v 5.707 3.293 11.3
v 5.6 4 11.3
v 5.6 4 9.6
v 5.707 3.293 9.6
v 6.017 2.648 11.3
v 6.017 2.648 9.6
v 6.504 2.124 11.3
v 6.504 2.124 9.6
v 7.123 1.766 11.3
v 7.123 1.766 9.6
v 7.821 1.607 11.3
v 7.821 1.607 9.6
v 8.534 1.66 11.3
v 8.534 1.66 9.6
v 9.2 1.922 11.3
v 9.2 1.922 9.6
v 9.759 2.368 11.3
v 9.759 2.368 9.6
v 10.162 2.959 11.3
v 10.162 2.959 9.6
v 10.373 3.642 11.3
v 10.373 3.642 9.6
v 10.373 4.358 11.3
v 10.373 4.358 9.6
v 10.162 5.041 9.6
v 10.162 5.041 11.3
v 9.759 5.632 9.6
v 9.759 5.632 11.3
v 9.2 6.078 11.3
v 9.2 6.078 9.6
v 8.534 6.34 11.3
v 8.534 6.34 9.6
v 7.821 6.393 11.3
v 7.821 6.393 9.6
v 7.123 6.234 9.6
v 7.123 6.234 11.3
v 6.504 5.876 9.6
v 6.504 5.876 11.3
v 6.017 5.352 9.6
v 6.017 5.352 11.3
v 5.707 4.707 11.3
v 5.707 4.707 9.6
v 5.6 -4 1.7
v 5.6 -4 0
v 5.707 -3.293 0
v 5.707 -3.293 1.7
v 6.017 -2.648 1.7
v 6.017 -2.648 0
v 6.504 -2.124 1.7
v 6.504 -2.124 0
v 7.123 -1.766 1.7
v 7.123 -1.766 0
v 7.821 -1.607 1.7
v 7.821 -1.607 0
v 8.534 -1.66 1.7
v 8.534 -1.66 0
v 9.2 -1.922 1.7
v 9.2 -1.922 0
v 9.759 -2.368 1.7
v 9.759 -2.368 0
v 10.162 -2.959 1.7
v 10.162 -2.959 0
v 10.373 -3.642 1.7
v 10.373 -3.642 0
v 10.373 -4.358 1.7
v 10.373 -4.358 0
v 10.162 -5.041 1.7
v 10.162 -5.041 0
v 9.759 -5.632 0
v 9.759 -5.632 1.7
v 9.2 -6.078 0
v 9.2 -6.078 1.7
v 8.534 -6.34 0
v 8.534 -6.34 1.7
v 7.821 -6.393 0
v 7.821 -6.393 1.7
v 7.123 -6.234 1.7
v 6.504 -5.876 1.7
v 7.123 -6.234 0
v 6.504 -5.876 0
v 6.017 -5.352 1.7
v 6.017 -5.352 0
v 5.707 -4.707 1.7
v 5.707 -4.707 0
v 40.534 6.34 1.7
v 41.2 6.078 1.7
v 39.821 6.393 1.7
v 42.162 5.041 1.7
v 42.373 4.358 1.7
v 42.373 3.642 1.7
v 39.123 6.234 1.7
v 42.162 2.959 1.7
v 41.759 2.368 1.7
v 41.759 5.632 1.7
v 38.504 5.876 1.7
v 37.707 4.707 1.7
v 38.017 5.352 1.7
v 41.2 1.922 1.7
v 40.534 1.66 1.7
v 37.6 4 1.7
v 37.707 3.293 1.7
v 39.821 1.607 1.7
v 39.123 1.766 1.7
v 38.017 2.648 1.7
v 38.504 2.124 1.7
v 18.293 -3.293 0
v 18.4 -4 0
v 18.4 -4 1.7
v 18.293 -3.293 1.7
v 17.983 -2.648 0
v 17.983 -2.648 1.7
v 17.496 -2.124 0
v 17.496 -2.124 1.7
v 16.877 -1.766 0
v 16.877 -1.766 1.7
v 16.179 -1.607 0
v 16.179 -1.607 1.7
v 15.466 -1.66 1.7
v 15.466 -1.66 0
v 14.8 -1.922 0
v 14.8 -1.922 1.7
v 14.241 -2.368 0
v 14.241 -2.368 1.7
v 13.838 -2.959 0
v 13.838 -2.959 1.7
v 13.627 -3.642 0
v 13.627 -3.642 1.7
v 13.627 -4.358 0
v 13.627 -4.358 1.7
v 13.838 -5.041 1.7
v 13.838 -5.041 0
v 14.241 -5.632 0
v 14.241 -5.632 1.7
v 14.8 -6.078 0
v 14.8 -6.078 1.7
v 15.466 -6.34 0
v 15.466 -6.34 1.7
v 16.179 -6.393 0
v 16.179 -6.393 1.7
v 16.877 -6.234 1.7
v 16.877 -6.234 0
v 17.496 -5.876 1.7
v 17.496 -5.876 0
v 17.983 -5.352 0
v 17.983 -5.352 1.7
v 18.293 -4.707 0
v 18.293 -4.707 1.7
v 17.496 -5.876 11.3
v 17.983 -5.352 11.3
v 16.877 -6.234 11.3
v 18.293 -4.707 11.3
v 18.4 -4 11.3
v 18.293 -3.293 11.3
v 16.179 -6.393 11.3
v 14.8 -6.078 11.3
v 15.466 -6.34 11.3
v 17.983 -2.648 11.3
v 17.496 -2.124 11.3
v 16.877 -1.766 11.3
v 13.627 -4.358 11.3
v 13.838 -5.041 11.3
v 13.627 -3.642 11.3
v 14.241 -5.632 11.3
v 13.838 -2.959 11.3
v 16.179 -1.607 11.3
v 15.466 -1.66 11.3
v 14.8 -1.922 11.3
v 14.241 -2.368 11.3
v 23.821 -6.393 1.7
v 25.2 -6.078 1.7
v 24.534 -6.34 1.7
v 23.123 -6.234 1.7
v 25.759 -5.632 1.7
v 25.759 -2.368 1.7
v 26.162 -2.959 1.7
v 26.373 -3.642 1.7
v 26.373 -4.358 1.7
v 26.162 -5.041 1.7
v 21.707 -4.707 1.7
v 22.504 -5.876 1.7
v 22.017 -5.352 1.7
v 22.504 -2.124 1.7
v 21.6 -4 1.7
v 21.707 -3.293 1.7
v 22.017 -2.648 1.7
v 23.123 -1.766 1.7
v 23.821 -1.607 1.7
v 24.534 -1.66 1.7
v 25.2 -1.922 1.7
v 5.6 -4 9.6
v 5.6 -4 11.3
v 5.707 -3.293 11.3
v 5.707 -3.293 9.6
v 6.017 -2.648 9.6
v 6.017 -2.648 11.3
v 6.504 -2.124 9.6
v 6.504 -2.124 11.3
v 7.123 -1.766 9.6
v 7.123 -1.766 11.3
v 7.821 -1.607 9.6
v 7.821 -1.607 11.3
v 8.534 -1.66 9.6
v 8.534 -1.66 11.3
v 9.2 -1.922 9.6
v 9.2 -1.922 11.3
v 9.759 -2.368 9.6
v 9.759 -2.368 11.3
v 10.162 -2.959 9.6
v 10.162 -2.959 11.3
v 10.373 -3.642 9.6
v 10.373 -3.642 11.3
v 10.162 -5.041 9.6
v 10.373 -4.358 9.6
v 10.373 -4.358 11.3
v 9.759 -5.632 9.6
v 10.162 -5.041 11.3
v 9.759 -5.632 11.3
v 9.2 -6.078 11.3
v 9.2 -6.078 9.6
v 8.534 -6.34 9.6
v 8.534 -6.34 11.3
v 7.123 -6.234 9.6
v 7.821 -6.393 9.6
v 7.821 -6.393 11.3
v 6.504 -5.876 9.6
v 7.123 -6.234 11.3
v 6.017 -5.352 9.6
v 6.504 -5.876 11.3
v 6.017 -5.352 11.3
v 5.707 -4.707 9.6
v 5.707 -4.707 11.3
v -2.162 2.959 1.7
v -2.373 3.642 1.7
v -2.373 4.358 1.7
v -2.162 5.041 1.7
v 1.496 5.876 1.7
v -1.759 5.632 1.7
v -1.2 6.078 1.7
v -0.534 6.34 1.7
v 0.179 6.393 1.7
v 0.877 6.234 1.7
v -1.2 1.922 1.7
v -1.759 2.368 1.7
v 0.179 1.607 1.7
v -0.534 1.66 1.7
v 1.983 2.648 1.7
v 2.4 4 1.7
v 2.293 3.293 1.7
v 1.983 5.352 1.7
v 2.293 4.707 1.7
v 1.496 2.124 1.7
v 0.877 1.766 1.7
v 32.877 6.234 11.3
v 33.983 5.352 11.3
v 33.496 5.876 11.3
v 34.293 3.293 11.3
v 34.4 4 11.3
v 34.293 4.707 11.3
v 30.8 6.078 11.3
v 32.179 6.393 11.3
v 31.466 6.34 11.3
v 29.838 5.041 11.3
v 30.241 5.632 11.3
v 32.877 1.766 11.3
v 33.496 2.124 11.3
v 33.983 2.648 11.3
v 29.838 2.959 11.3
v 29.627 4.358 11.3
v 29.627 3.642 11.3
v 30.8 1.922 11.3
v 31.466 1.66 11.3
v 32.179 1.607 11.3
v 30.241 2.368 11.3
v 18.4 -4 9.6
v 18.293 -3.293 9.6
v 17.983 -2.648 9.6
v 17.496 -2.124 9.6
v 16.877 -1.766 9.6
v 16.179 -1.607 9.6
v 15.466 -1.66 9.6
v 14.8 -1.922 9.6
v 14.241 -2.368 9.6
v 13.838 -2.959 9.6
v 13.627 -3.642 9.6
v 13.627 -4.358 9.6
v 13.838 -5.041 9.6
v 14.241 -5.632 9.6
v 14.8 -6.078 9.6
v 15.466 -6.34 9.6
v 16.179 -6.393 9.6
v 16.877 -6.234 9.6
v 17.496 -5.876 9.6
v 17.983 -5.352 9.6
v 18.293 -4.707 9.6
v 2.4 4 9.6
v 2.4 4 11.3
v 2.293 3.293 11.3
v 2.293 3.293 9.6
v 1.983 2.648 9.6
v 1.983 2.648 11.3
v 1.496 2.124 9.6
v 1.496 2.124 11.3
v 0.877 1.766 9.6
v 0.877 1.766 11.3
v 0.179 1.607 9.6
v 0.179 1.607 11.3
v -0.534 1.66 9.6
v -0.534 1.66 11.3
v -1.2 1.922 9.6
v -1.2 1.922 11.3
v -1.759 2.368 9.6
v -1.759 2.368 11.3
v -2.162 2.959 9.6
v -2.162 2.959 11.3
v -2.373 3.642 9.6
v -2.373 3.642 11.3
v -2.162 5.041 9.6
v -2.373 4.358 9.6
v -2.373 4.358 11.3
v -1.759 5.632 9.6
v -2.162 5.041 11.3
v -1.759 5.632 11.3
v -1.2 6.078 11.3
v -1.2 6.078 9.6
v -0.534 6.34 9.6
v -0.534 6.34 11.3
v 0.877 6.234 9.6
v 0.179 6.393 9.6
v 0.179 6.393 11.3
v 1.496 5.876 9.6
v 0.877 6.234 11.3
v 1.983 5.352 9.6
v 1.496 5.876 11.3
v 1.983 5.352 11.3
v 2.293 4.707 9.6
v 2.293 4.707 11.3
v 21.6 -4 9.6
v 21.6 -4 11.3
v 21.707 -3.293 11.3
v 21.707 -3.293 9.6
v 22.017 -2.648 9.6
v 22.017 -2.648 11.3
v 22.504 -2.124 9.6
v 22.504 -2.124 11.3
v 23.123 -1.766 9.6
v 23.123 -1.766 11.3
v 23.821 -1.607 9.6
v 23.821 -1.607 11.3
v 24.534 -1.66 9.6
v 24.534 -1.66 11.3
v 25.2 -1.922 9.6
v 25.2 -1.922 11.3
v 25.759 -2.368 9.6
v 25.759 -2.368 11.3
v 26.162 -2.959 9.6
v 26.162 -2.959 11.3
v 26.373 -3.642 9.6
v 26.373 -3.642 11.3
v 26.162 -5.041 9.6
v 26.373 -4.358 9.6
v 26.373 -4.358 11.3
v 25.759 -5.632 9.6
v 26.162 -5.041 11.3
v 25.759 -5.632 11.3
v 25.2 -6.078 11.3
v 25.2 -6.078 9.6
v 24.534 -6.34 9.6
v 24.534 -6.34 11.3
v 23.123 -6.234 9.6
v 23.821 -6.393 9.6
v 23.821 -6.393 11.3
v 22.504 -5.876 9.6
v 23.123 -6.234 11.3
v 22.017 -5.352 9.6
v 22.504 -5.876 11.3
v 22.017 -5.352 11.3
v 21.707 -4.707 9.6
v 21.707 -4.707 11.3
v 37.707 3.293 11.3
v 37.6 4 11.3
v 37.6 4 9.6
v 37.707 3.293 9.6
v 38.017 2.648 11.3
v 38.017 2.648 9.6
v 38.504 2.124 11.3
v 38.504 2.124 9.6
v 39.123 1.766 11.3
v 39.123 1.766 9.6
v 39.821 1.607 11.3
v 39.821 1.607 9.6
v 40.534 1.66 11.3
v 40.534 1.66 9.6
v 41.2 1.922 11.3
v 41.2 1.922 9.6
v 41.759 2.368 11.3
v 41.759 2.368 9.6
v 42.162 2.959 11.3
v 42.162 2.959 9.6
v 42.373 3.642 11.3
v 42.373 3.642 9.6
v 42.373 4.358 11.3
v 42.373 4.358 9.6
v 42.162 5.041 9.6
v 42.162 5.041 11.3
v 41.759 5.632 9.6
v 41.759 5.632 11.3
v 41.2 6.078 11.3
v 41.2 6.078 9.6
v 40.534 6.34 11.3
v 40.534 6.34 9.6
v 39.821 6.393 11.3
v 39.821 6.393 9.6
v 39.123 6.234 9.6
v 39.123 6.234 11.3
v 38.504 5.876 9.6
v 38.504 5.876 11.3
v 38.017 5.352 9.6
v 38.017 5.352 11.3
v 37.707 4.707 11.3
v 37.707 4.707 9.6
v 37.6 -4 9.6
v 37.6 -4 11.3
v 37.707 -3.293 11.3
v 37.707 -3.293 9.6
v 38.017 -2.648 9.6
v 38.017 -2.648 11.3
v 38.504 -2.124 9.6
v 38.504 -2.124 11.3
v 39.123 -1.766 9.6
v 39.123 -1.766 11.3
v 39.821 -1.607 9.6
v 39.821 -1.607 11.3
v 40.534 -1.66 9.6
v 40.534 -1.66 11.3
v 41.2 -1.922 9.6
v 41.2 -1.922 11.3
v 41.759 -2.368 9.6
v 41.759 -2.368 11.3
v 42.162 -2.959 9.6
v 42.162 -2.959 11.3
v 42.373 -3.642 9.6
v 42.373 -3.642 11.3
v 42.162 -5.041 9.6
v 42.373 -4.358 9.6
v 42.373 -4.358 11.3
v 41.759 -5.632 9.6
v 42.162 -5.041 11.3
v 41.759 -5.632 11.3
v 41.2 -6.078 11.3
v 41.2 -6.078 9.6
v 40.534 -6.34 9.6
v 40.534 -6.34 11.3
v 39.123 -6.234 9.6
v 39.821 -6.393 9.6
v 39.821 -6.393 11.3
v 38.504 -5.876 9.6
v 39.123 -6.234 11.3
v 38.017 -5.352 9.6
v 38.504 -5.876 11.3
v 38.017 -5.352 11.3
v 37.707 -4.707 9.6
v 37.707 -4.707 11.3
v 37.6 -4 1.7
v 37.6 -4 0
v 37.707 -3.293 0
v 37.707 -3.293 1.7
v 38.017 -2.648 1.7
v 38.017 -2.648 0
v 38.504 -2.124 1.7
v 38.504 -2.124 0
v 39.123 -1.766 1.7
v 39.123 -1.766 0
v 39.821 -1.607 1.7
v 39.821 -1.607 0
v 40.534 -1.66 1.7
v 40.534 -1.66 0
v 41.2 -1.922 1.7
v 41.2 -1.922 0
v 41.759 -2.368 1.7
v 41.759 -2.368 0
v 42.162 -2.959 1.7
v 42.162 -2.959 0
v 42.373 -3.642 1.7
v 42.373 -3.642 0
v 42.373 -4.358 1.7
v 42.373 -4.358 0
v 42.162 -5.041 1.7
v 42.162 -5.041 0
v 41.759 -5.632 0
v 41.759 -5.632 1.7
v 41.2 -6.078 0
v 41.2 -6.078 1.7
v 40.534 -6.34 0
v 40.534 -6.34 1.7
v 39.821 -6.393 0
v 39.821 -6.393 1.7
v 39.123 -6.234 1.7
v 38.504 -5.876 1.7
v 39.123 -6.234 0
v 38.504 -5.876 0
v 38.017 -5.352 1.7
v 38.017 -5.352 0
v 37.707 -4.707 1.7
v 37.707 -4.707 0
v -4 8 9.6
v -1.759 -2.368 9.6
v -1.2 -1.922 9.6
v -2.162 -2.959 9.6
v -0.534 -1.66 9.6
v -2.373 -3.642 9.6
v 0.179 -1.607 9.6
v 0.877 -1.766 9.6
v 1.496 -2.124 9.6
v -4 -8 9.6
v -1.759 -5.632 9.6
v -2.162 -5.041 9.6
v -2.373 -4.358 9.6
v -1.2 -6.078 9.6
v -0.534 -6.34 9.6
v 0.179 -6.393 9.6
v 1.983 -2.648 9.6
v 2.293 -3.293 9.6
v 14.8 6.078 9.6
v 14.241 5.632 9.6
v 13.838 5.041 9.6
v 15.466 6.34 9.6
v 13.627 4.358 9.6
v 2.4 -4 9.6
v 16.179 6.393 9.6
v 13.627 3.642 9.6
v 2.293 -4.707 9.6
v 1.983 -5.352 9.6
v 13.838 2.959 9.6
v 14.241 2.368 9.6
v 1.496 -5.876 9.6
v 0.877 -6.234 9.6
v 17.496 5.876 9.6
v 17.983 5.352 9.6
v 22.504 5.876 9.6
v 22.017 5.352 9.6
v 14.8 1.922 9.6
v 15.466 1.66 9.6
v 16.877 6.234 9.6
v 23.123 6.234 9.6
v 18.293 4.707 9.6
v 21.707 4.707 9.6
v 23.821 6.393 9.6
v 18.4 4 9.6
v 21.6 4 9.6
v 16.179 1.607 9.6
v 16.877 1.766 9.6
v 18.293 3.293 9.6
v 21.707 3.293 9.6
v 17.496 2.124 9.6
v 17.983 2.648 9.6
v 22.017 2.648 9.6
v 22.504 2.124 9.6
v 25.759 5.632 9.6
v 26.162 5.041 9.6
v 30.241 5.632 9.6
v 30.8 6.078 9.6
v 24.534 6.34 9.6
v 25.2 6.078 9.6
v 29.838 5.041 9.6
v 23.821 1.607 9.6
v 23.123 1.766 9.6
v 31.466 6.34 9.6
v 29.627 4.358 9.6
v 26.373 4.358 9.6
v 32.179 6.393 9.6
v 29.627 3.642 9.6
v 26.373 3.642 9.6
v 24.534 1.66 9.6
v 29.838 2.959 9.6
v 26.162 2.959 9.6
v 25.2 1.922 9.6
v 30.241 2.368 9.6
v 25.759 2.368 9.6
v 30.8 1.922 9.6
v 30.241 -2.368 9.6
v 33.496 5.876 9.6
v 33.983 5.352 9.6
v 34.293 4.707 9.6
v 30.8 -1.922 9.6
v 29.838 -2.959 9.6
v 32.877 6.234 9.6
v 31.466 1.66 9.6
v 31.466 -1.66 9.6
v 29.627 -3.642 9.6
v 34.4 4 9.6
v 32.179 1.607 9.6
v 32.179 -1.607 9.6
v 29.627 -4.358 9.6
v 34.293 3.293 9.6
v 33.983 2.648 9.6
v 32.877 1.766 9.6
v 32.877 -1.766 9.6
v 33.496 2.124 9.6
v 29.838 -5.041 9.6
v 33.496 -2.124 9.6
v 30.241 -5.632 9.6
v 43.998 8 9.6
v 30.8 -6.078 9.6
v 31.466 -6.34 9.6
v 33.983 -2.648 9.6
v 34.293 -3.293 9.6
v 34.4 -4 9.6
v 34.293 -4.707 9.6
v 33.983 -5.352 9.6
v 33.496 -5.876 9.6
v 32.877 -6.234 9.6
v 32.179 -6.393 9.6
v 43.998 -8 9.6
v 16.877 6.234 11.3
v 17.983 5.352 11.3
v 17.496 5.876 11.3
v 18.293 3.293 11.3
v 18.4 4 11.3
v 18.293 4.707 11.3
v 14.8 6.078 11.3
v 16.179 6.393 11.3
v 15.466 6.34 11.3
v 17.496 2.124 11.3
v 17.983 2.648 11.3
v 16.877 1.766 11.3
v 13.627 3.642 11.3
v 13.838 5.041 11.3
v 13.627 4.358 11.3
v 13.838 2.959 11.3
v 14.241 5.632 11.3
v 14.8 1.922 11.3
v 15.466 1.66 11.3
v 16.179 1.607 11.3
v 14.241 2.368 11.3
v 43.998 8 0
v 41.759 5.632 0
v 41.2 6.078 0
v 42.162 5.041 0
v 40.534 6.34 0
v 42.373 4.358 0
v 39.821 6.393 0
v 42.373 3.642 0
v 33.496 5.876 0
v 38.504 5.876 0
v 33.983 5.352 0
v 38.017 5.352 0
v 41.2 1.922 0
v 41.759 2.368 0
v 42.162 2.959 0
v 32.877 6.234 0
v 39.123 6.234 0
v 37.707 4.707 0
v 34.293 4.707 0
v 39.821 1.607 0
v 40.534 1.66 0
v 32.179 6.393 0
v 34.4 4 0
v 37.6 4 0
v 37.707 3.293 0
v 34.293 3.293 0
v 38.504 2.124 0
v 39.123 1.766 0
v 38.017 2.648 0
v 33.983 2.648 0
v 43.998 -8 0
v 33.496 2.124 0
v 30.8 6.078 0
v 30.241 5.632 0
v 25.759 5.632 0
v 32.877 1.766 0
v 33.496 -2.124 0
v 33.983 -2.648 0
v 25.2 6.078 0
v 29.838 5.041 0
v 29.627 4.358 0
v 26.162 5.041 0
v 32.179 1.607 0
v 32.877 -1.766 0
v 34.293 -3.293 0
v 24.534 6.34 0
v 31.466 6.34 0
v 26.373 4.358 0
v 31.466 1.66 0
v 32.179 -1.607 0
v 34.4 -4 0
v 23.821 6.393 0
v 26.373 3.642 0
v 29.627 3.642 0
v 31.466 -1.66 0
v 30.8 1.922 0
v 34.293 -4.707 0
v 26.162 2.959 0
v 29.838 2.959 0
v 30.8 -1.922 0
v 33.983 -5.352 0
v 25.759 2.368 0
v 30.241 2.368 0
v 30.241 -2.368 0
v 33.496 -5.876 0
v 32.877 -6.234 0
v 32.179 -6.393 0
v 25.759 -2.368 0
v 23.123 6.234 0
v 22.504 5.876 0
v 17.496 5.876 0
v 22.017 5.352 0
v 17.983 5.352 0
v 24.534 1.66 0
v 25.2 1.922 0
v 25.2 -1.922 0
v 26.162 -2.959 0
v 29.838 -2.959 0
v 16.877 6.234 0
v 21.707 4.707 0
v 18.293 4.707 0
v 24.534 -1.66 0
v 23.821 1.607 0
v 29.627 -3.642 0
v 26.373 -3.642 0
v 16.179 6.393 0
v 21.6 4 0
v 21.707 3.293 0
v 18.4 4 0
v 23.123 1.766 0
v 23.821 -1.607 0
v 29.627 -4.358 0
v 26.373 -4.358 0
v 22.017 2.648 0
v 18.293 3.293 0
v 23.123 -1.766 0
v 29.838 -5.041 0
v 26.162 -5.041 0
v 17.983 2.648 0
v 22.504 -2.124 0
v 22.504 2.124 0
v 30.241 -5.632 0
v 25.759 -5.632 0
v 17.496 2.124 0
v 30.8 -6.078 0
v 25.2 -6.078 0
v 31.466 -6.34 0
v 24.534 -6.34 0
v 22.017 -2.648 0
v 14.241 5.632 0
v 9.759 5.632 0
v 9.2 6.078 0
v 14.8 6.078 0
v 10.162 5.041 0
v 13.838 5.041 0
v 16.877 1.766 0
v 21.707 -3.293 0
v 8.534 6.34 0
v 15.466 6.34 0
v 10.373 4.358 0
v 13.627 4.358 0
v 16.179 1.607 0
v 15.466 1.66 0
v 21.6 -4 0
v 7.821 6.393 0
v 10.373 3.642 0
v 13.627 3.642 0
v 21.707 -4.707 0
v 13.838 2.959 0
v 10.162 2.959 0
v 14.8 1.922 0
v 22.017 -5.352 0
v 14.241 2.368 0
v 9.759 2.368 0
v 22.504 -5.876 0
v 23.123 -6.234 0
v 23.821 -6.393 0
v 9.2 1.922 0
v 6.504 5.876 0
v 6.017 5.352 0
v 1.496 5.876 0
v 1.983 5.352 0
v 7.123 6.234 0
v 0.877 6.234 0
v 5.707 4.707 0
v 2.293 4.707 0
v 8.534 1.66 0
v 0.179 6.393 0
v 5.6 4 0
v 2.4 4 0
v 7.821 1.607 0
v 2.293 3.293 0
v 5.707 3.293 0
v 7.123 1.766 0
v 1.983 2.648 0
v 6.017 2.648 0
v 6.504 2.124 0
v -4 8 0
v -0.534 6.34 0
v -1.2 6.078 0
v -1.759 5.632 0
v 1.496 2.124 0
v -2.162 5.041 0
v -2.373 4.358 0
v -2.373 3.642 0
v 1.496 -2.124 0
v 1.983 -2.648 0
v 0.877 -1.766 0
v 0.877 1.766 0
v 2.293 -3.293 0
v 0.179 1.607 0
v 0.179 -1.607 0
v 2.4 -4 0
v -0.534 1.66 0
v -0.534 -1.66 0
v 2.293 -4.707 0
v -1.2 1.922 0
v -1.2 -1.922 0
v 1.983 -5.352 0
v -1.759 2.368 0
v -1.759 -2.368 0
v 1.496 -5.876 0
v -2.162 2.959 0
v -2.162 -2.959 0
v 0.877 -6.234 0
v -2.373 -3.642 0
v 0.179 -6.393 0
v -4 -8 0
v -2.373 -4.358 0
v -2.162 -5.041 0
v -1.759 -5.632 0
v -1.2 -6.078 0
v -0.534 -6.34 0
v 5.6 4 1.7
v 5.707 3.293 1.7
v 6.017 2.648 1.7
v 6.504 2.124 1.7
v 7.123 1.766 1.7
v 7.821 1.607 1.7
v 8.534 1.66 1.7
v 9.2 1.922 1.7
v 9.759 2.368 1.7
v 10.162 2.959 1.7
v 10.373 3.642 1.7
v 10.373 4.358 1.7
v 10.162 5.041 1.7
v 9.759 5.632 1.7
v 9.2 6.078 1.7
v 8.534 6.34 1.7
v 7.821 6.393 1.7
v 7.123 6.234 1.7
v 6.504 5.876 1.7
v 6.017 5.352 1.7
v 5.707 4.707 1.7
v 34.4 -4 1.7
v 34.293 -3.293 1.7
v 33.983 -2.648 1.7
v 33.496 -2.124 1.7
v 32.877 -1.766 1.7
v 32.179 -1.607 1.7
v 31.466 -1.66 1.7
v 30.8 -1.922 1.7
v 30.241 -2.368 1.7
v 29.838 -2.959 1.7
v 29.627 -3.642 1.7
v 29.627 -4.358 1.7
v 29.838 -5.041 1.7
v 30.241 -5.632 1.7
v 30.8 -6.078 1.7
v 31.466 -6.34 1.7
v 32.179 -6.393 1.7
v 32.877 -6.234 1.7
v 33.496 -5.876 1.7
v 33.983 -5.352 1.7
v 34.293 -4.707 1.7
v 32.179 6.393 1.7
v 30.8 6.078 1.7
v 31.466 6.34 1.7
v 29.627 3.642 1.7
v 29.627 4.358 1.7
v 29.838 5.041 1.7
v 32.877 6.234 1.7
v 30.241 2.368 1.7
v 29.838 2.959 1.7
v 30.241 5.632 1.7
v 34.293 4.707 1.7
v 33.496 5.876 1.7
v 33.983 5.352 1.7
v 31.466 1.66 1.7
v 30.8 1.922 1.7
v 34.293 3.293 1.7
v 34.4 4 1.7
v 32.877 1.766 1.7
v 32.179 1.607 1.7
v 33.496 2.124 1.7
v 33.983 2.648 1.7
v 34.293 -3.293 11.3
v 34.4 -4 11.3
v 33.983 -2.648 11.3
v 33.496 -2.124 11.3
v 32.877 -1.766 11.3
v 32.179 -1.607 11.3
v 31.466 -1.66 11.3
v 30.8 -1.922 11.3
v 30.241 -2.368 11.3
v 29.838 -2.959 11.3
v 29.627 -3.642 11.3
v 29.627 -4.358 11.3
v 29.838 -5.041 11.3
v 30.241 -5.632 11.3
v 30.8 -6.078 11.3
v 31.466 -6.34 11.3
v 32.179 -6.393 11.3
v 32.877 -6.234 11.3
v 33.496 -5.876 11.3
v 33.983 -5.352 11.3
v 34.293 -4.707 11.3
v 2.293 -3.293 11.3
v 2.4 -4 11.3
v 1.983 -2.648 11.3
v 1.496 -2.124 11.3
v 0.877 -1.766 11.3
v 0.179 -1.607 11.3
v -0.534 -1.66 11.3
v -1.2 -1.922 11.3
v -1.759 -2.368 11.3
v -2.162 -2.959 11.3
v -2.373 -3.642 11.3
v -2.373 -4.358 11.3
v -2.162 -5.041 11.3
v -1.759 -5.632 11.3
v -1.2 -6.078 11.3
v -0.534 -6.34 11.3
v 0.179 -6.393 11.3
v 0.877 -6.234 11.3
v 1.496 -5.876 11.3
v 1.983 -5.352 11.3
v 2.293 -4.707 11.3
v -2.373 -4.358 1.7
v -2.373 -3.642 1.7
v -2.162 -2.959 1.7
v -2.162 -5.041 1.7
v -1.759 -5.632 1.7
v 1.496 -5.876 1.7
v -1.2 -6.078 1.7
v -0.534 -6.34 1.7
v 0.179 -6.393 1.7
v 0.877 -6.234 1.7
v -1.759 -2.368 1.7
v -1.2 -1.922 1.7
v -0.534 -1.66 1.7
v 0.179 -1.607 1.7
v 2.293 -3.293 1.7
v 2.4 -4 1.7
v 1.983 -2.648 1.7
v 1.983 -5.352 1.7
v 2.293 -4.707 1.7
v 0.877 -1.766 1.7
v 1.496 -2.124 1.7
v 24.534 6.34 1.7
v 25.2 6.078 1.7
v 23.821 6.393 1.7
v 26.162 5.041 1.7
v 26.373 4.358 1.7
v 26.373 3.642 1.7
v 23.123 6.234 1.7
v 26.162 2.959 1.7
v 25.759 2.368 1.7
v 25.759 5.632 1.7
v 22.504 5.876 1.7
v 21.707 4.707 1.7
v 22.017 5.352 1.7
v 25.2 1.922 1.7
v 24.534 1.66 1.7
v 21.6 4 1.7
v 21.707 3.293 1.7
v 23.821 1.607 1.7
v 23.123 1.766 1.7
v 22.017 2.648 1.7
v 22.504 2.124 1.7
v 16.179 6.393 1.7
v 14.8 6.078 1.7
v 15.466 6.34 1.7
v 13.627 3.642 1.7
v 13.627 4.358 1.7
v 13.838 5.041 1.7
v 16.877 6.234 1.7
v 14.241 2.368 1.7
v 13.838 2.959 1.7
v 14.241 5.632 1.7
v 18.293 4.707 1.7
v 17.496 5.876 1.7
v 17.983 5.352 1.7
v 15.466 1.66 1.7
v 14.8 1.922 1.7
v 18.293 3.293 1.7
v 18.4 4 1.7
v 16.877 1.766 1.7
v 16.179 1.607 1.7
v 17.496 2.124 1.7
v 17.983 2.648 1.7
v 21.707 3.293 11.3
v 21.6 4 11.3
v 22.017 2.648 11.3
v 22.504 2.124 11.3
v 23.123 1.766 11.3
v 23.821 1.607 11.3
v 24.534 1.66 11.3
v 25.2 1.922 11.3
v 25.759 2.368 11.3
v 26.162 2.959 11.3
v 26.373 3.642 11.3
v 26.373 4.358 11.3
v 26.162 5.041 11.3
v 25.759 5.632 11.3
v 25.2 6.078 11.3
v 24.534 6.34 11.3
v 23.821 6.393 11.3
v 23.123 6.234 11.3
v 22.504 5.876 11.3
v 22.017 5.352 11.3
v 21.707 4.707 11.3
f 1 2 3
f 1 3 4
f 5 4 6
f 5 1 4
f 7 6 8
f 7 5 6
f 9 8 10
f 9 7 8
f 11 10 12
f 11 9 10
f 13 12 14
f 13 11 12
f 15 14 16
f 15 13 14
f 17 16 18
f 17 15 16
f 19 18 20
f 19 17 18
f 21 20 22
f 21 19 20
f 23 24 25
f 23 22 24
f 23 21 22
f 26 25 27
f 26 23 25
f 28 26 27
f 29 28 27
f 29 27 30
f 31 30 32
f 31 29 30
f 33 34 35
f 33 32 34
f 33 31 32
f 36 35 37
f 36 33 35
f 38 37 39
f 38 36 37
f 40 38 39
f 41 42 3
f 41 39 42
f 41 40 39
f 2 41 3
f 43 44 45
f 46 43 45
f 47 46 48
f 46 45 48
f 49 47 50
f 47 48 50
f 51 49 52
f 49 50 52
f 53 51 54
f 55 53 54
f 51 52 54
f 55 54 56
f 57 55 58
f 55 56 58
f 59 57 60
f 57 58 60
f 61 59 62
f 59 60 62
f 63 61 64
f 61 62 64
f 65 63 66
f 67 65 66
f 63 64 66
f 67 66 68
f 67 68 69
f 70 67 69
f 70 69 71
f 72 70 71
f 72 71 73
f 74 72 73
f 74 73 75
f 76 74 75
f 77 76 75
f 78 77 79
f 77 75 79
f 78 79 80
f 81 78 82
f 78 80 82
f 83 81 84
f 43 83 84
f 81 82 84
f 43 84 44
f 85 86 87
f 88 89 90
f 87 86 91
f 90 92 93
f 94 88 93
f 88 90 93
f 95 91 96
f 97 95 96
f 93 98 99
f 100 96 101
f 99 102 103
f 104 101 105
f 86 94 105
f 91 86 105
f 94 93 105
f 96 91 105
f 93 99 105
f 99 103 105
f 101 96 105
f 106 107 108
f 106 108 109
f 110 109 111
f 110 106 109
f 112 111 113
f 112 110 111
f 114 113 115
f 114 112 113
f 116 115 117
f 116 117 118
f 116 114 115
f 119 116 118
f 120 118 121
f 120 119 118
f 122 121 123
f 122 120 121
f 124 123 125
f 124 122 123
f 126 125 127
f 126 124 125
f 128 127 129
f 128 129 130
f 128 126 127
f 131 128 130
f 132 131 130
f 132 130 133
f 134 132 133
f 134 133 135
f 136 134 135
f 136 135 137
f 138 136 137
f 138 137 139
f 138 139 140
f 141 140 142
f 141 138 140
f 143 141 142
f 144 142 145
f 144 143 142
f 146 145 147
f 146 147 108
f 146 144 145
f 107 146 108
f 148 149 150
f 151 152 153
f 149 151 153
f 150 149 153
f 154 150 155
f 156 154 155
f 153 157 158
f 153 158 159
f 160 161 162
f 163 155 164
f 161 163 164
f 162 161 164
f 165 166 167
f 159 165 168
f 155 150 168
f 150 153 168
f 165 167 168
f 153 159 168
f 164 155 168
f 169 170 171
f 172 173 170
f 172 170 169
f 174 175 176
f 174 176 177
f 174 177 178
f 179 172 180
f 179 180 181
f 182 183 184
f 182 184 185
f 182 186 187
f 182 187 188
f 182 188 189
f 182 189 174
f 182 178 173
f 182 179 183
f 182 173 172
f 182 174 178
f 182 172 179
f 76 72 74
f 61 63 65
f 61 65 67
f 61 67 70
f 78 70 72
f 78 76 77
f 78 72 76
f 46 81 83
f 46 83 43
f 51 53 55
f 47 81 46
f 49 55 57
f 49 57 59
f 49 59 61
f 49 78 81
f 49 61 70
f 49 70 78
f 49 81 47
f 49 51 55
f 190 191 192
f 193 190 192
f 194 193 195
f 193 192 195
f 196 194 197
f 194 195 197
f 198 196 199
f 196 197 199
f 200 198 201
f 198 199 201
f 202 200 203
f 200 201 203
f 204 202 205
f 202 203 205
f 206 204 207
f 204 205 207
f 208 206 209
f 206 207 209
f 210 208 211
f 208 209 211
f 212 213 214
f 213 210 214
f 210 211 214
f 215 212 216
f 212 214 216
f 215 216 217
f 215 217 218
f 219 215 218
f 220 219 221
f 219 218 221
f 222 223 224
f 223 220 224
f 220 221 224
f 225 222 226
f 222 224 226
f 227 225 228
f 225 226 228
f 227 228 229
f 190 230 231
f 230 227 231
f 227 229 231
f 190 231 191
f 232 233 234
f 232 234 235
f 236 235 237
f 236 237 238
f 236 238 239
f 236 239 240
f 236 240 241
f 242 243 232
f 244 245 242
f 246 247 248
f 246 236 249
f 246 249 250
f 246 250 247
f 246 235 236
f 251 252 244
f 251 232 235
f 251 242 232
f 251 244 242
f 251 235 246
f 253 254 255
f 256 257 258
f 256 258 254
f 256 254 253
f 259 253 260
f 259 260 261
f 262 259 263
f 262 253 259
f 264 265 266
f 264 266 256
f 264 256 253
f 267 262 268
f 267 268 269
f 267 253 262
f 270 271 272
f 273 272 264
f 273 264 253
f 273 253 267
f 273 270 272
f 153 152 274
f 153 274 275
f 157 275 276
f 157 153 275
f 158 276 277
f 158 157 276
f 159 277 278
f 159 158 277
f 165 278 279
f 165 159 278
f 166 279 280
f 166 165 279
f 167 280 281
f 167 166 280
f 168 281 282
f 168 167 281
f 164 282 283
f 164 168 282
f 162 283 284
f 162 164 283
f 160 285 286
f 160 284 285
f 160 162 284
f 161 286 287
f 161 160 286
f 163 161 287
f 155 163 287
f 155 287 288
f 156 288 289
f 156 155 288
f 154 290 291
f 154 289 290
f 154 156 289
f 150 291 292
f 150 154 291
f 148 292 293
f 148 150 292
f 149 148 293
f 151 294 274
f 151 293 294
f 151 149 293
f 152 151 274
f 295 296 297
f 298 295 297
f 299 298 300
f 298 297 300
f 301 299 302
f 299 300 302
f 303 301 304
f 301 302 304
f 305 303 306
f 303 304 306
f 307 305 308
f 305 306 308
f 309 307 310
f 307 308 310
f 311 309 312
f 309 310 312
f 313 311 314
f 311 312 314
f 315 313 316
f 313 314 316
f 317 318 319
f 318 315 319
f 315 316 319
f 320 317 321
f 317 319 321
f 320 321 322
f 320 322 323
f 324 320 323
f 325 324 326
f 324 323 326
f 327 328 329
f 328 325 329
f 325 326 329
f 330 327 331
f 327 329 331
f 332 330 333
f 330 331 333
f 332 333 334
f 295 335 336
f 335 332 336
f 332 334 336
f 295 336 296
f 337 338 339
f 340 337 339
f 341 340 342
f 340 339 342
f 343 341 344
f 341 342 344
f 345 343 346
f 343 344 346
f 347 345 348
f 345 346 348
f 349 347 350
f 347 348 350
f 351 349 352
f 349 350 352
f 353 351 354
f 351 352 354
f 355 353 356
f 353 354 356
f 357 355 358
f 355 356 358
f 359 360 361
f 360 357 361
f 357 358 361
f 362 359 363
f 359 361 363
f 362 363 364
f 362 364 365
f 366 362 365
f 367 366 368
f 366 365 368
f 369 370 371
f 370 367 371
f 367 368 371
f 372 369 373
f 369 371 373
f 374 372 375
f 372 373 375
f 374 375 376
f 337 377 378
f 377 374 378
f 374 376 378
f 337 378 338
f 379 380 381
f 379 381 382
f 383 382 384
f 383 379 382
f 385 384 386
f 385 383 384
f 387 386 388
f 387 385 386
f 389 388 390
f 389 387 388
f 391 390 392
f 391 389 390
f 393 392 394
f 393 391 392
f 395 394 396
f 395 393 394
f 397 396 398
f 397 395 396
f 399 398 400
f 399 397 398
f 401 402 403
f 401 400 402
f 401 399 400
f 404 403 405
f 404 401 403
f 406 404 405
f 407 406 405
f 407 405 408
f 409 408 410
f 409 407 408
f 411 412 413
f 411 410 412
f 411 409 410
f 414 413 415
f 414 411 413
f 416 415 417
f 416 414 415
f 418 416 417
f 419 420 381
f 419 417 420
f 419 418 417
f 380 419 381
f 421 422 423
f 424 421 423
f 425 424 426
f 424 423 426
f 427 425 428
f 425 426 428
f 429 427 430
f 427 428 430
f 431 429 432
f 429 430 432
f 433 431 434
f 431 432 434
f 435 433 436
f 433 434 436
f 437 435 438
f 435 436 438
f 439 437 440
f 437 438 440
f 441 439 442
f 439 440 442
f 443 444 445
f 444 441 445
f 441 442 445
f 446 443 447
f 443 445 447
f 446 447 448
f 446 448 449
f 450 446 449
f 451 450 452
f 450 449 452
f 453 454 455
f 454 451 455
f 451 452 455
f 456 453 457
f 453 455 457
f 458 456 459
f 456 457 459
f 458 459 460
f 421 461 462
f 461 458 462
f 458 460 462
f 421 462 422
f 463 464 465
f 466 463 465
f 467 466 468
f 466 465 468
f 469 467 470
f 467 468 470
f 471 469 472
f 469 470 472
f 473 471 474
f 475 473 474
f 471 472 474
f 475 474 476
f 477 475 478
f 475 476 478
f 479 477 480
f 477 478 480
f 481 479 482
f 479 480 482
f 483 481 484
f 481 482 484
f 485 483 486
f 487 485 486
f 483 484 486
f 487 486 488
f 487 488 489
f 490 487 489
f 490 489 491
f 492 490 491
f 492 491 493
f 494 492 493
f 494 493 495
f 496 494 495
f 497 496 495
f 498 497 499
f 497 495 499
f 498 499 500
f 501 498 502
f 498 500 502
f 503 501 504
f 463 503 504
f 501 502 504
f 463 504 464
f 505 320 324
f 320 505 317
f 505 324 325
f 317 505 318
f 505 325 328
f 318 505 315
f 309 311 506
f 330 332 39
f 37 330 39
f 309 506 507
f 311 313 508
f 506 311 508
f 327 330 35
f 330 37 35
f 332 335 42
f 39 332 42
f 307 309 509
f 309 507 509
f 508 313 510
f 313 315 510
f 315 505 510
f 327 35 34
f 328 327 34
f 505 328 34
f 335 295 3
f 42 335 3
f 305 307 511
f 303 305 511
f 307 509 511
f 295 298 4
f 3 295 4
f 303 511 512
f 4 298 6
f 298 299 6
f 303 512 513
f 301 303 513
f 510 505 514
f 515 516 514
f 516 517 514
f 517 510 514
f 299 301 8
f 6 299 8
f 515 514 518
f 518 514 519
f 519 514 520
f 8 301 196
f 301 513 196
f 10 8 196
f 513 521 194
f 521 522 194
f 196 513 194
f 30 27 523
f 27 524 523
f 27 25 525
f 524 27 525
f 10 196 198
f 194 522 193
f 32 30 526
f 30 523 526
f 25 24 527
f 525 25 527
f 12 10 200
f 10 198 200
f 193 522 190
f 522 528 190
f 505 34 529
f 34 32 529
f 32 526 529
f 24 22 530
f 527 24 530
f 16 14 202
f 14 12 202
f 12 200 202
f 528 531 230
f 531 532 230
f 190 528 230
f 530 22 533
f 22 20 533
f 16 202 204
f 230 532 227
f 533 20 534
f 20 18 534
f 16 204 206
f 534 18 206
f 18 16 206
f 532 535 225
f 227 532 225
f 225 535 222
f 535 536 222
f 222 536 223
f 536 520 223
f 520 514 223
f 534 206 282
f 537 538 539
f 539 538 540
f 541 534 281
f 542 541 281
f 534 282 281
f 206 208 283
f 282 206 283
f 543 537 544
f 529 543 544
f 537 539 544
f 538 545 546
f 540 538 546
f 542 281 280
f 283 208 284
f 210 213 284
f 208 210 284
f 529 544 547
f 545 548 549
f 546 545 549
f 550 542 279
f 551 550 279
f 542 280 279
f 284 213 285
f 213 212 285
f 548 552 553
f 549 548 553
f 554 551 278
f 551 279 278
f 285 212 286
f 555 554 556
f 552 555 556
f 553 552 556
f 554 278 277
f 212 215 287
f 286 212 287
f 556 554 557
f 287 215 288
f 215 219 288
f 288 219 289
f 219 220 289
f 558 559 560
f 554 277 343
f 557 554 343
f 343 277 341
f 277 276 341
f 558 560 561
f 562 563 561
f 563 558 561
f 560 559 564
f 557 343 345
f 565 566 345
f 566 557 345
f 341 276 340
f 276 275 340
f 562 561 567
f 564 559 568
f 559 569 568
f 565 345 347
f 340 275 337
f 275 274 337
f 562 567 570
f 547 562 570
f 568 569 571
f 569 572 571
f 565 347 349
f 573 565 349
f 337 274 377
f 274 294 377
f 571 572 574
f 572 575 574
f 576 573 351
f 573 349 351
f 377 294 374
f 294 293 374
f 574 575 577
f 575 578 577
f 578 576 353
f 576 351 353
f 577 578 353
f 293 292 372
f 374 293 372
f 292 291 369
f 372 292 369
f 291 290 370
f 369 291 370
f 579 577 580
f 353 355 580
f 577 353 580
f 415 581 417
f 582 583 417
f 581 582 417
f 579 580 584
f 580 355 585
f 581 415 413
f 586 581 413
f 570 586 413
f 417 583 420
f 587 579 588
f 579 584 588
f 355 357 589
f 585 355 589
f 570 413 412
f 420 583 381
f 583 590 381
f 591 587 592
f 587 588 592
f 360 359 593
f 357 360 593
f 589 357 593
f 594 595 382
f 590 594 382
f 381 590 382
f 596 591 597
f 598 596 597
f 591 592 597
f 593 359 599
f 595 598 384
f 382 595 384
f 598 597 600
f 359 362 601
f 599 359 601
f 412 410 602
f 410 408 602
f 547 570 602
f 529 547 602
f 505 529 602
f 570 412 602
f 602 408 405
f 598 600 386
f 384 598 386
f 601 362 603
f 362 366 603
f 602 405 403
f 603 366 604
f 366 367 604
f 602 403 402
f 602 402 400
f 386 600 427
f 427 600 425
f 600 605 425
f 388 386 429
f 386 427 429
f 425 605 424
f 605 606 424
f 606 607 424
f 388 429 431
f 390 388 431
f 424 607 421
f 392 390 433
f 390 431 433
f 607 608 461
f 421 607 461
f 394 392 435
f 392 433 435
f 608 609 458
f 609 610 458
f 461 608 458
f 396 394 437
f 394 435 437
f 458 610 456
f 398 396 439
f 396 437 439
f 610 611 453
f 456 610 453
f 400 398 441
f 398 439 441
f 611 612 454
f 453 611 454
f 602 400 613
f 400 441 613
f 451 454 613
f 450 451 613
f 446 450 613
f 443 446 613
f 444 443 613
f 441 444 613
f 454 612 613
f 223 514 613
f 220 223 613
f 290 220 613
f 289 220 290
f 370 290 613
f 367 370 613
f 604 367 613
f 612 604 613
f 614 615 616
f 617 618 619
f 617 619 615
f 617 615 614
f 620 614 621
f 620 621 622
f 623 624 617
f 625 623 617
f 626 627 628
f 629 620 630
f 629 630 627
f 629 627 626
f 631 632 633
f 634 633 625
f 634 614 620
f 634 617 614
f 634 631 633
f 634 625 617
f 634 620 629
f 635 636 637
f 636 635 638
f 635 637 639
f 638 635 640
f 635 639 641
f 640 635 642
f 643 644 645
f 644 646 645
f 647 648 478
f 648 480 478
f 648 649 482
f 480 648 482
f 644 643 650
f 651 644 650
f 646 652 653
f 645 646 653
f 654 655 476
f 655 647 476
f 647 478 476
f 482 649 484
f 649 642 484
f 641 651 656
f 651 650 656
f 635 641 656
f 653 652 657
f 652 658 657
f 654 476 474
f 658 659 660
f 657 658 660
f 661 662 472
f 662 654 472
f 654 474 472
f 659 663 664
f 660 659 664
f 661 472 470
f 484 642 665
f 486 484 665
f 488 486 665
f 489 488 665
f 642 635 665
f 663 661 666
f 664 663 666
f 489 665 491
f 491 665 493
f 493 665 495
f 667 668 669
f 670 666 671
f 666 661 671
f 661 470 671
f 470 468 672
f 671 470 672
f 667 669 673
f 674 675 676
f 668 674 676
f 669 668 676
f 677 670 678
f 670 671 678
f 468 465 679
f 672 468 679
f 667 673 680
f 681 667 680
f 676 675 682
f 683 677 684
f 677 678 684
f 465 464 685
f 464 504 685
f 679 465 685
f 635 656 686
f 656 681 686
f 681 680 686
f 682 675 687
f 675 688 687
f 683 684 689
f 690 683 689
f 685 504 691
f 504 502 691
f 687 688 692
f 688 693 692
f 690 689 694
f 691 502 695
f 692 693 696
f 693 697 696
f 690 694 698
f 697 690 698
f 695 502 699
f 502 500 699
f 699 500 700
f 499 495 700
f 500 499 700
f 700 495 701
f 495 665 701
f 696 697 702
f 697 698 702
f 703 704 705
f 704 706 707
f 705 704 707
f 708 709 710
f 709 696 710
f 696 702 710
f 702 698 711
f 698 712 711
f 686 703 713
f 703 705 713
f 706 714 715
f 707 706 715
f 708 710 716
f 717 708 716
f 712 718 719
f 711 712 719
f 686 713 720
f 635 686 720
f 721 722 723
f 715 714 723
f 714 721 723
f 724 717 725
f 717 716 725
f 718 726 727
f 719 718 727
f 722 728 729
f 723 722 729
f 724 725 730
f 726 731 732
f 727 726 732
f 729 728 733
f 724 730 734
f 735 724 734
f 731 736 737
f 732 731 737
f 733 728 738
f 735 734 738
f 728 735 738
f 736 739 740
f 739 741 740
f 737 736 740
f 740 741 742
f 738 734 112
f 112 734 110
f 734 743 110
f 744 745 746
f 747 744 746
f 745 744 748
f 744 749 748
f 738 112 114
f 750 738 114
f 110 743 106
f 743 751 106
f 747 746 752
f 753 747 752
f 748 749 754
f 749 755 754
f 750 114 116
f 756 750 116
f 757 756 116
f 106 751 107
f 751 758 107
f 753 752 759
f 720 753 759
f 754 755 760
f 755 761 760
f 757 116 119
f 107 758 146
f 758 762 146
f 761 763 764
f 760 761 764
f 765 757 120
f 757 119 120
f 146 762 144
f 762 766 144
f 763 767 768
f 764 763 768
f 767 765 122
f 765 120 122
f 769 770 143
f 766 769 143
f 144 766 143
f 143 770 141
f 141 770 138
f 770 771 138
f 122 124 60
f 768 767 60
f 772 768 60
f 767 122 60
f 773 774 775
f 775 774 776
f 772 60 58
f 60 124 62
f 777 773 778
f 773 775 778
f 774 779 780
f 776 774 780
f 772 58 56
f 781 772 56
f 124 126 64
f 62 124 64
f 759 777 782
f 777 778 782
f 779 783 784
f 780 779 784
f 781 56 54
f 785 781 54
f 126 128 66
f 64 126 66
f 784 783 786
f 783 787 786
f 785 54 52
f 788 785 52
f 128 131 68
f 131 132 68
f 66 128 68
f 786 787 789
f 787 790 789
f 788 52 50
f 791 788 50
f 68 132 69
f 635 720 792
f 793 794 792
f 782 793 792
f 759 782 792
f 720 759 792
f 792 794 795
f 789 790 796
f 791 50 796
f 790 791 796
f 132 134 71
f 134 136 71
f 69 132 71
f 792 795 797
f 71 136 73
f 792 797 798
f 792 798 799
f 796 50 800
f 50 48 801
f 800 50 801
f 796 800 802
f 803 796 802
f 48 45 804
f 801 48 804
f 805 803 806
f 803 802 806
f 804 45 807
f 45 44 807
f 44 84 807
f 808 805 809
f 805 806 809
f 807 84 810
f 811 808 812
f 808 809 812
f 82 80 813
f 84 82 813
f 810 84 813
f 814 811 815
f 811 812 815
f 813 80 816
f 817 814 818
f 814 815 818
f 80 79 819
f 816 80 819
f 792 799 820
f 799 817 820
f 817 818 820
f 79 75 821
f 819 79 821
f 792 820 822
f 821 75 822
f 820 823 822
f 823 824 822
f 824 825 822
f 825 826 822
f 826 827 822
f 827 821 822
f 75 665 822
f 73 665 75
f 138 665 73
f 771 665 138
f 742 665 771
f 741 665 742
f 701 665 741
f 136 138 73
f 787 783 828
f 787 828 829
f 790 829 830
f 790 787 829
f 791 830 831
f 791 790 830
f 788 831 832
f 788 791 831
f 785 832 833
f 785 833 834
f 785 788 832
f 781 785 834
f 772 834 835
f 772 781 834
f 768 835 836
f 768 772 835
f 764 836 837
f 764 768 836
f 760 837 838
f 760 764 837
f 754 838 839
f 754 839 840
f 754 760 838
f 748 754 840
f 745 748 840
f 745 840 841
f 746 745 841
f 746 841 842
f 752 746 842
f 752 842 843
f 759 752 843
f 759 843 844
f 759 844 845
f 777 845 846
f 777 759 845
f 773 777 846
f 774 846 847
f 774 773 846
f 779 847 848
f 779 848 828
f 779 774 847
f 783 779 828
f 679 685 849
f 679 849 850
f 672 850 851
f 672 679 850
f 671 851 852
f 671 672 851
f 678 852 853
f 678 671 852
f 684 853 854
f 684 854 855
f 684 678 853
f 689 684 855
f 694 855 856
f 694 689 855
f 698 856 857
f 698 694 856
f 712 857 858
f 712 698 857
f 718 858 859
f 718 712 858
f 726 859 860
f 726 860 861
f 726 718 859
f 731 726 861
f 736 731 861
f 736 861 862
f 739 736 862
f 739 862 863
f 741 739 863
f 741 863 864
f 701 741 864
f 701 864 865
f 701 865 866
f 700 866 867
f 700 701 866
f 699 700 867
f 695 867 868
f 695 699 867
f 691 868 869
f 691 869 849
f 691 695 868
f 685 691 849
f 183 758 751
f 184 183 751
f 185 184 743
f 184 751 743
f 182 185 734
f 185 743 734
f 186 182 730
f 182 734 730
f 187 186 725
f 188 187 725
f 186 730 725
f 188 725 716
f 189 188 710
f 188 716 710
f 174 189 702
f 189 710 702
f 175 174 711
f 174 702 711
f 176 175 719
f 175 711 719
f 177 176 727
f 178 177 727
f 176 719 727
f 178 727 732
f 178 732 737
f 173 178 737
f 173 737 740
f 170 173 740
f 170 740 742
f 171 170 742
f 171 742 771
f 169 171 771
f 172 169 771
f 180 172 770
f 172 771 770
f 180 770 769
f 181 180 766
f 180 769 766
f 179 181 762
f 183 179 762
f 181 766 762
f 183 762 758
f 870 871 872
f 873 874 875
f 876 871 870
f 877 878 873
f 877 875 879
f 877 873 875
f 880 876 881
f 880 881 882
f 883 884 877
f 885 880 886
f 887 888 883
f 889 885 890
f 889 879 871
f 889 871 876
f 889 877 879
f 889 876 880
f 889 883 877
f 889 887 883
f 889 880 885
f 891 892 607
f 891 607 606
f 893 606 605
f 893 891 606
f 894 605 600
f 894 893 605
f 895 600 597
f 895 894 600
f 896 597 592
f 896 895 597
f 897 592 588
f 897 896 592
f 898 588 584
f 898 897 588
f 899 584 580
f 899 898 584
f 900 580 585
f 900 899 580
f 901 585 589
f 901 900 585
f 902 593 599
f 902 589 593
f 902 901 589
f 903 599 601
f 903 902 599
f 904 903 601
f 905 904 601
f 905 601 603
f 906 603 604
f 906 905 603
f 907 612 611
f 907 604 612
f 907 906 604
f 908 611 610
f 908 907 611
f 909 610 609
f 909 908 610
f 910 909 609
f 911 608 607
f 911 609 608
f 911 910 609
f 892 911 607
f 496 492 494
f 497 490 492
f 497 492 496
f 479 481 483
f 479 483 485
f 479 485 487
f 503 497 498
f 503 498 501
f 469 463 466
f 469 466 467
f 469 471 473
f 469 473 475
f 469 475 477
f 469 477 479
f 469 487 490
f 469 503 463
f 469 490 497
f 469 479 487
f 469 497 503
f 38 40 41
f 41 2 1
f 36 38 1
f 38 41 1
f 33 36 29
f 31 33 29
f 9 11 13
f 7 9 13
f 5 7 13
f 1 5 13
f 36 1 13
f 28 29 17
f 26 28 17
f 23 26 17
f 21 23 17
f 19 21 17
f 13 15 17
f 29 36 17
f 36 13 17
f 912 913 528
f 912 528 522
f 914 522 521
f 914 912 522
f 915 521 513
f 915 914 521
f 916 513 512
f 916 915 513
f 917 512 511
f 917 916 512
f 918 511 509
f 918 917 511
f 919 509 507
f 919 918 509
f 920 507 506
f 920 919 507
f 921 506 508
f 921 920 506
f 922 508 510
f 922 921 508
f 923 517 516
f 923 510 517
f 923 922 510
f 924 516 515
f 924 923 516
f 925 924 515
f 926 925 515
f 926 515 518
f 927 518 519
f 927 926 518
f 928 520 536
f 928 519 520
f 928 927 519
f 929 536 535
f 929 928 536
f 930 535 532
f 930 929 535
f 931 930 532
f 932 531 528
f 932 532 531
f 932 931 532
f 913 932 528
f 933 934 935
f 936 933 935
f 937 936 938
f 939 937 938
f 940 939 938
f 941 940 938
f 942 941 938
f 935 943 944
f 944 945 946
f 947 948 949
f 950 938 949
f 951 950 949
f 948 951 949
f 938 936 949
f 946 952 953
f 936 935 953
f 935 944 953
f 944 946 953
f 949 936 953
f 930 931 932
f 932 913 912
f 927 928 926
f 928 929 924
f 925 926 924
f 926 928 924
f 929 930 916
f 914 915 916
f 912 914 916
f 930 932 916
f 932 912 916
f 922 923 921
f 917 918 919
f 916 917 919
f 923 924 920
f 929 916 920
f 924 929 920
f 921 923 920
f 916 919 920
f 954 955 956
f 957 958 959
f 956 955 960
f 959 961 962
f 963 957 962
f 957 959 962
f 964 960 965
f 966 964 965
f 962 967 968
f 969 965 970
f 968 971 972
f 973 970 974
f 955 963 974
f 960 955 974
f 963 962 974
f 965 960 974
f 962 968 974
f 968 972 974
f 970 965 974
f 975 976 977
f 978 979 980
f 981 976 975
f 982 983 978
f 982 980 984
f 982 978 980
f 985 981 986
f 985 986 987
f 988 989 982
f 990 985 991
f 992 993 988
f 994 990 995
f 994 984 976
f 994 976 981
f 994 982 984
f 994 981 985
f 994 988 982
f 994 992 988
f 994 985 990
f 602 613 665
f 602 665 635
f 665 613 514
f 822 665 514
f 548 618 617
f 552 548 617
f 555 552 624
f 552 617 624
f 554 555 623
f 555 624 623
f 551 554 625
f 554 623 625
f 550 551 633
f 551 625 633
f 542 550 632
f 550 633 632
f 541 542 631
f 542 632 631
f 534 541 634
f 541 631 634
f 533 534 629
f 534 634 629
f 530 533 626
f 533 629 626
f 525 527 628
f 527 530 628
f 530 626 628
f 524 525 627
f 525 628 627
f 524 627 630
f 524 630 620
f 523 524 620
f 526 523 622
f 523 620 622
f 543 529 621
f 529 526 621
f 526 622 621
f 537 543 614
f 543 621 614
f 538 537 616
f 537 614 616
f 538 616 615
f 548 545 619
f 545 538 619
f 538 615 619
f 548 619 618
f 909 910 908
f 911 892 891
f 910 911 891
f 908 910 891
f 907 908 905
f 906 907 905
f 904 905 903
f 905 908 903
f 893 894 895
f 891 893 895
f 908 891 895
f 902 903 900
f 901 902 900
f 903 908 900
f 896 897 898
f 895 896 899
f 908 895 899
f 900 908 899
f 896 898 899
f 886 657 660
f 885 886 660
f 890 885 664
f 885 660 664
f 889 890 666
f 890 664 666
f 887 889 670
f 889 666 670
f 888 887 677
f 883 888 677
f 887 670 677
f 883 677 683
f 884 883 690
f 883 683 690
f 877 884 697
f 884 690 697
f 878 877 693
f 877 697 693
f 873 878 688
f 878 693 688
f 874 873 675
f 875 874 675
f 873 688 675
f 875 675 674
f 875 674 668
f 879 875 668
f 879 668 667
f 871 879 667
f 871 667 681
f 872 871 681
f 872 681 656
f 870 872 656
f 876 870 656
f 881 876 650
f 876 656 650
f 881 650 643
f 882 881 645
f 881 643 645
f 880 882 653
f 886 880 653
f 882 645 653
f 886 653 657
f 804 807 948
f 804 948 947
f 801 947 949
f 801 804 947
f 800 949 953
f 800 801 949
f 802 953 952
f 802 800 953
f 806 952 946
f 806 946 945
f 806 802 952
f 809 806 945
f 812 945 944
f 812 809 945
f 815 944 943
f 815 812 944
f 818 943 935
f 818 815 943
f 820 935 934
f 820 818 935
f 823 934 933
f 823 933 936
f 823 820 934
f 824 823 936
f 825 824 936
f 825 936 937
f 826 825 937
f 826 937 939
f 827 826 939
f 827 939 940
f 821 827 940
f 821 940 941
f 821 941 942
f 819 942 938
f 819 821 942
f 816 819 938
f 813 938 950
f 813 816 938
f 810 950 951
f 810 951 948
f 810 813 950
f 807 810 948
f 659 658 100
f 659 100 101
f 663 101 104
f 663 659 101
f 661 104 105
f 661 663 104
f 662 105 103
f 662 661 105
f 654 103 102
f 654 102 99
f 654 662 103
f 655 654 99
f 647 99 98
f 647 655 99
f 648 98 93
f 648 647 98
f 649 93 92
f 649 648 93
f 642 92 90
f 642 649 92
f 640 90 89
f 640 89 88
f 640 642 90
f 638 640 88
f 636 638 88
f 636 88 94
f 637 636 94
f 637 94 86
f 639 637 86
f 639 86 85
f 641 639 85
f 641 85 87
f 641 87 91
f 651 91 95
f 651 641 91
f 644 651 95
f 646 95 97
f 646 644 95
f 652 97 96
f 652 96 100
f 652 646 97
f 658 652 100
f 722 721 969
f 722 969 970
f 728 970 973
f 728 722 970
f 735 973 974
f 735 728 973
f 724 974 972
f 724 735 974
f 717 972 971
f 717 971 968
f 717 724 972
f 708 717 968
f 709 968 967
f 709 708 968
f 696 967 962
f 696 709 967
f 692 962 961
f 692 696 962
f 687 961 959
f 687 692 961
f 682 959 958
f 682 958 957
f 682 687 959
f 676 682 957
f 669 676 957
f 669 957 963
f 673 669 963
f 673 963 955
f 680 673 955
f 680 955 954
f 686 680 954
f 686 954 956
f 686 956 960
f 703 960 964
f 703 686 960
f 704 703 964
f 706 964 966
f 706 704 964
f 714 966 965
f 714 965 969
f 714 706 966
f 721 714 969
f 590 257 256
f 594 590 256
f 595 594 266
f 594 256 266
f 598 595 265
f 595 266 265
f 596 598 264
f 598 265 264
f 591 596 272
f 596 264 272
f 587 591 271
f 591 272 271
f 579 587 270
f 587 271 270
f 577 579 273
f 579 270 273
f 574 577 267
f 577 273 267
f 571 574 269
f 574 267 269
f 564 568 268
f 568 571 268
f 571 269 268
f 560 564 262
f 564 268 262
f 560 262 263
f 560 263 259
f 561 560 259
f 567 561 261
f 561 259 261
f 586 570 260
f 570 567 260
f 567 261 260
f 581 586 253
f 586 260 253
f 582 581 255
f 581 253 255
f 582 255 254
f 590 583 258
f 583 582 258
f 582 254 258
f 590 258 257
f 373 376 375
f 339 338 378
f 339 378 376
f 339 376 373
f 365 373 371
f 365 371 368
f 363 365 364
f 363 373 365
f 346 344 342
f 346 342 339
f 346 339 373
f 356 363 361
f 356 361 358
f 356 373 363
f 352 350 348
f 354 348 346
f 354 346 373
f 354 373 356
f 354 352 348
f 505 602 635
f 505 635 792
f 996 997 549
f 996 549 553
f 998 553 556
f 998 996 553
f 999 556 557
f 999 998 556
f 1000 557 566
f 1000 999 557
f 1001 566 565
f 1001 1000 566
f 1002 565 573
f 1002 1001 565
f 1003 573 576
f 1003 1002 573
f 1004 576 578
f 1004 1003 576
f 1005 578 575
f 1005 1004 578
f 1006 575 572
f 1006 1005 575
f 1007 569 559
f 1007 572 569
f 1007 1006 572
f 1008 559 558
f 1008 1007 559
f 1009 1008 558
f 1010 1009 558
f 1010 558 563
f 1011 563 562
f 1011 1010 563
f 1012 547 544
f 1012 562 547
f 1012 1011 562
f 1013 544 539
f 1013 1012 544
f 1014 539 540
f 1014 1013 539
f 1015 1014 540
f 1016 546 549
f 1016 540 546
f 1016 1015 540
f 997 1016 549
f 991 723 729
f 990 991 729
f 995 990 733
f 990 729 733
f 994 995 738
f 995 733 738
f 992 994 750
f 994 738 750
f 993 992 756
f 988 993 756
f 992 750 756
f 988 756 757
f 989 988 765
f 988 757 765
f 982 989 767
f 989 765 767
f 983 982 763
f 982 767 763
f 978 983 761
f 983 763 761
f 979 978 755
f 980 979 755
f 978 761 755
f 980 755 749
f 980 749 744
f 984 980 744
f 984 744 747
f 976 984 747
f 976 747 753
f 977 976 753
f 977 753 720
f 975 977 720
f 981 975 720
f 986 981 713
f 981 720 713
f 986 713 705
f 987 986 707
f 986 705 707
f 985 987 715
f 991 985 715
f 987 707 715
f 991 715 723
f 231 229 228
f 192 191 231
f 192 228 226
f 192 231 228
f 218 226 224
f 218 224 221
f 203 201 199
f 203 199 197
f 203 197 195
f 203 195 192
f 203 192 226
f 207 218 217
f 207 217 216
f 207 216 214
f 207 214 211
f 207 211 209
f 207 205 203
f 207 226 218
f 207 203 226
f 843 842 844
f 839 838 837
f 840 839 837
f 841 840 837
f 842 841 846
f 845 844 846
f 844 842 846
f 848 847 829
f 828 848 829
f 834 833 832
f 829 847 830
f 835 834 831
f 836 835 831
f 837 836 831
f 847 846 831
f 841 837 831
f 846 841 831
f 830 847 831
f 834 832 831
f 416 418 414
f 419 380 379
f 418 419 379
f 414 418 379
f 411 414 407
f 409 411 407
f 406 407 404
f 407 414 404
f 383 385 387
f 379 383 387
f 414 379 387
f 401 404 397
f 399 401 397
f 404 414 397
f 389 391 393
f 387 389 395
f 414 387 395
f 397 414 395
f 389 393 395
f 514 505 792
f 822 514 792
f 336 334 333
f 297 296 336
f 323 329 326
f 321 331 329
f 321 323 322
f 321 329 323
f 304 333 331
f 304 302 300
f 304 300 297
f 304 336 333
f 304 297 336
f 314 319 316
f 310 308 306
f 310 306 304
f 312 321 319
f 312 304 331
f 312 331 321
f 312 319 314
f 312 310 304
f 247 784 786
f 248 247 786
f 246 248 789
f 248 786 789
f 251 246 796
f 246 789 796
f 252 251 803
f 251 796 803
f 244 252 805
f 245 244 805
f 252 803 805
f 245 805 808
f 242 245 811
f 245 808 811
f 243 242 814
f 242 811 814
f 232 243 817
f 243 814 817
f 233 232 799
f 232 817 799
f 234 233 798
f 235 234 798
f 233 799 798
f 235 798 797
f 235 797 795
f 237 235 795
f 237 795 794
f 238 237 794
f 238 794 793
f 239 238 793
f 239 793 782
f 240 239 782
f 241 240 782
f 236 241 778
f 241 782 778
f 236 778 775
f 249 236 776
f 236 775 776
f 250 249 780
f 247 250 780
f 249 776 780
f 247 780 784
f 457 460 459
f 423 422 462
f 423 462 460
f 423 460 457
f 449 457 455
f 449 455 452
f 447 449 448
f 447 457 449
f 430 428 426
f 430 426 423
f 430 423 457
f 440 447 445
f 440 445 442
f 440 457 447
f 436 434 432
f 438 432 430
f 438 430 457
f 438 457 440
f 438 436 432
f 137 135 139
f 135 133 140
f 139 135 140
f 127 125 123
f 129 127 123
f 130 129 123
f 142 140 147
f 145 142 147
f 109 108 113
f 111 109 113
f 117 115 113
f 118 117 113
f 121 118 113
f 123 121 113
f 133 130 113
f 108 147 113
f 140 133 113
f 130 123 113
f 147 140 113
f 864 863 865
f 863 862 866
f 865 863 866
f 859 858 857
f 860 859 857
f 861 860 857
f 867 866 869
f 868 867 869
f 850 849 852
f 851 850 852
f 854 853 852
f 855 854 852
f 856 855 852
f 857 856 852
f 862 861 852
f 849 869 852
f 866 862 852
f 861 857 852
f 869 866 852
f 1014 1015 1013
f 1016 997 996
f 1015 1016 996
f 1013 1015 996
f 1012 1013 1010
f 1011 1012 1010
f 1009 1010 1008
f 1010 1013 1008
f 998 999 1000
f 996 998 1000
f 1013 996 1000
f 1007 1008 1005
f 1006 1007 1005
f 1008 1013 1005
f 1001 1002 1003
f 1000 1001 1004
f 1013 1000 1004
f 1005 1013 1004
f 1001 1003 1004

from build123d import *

# Parameters (mm, degrees)
F1_DEPTH  = 8
F3_W      = 8
F3_H      = 8
F3_R      = 2.4
F4_DEPTH  = 1.7
F5_R      = 2.4
F6_DEPTH  = 1.7
F14_W     = 33.3092473447
F14_H     = 24.2573712021
F15_DEPTH = 16.002


with BuildPart() as f1:
    # F0 (on Front) → F1 (new body)
    with BuildSketch(Plane.XZ):
        Polygon((-2.4, 9.6), (-4, 9.6), (-4, 0), (4, 0), (4, 9.6), (2.4, 9.6), (2.4, 11.3), (-2.4, 11.3), align=None)
    extrude(amount=F1_DEPTH)

    # F3 (on plane+point) → F4 (cut, through all)
    with BuildSketch(Plane.XY.offset(11.3)):
        with Locations((0, -4)):
            Rectangle(F3_W, F3_H)
        with Locations((0, -4)):
            Circle(F3_R, mode=Mode.SUBTRACT)
    extrude(amount=-F4_DEPTH, mode=Mode.SUBTRACT)

    # F5 (on Top) → F6 (cut)
    with BuildSketch(Plane.XY):
        with Locations((0, -4)):
            Circle(F5_R)
    extrude(amount=F6_DEPTH, mode=Mode.SUBTRACT)

    # F8: F1 across plane


with BuildPart() as f1_1:
    add(f1.part)
    add(f1.part.mirror(Plane.YZ.offset(4)))

    # F9: F1 across plane


with BuildPart() as f1_2:
    add(f1_1.part)
    add(f1_1.part.mirror(Plane.XZ))

    # F11: F1 across plane


with BuildPart() as f1_3:
    add(f1_2.part)
    add(f1_2.part.mirror(Plane.YZ.offset(12)))

    # F12: F1 across face


with BuildPart() as f1_4:
    add(f1_3.part)
    add(f1_3.part.mirror(Plane(origin=(28, 0, 4.8), x_dir=(0, 1, 0), z_dir=(1, 0, 0))))

    # F14 (on offset) → F15 (cut)
    with BuildSketch(Plane.YZ.offset(60)):
        with Locations((2.0649190992, 4.5698834583)):
            Rectangle(F14_W, F14_H)
    extrude(amount=-F15_DEPTH, mode=Mode.SUBTRACT)


solid = f1_4.part
